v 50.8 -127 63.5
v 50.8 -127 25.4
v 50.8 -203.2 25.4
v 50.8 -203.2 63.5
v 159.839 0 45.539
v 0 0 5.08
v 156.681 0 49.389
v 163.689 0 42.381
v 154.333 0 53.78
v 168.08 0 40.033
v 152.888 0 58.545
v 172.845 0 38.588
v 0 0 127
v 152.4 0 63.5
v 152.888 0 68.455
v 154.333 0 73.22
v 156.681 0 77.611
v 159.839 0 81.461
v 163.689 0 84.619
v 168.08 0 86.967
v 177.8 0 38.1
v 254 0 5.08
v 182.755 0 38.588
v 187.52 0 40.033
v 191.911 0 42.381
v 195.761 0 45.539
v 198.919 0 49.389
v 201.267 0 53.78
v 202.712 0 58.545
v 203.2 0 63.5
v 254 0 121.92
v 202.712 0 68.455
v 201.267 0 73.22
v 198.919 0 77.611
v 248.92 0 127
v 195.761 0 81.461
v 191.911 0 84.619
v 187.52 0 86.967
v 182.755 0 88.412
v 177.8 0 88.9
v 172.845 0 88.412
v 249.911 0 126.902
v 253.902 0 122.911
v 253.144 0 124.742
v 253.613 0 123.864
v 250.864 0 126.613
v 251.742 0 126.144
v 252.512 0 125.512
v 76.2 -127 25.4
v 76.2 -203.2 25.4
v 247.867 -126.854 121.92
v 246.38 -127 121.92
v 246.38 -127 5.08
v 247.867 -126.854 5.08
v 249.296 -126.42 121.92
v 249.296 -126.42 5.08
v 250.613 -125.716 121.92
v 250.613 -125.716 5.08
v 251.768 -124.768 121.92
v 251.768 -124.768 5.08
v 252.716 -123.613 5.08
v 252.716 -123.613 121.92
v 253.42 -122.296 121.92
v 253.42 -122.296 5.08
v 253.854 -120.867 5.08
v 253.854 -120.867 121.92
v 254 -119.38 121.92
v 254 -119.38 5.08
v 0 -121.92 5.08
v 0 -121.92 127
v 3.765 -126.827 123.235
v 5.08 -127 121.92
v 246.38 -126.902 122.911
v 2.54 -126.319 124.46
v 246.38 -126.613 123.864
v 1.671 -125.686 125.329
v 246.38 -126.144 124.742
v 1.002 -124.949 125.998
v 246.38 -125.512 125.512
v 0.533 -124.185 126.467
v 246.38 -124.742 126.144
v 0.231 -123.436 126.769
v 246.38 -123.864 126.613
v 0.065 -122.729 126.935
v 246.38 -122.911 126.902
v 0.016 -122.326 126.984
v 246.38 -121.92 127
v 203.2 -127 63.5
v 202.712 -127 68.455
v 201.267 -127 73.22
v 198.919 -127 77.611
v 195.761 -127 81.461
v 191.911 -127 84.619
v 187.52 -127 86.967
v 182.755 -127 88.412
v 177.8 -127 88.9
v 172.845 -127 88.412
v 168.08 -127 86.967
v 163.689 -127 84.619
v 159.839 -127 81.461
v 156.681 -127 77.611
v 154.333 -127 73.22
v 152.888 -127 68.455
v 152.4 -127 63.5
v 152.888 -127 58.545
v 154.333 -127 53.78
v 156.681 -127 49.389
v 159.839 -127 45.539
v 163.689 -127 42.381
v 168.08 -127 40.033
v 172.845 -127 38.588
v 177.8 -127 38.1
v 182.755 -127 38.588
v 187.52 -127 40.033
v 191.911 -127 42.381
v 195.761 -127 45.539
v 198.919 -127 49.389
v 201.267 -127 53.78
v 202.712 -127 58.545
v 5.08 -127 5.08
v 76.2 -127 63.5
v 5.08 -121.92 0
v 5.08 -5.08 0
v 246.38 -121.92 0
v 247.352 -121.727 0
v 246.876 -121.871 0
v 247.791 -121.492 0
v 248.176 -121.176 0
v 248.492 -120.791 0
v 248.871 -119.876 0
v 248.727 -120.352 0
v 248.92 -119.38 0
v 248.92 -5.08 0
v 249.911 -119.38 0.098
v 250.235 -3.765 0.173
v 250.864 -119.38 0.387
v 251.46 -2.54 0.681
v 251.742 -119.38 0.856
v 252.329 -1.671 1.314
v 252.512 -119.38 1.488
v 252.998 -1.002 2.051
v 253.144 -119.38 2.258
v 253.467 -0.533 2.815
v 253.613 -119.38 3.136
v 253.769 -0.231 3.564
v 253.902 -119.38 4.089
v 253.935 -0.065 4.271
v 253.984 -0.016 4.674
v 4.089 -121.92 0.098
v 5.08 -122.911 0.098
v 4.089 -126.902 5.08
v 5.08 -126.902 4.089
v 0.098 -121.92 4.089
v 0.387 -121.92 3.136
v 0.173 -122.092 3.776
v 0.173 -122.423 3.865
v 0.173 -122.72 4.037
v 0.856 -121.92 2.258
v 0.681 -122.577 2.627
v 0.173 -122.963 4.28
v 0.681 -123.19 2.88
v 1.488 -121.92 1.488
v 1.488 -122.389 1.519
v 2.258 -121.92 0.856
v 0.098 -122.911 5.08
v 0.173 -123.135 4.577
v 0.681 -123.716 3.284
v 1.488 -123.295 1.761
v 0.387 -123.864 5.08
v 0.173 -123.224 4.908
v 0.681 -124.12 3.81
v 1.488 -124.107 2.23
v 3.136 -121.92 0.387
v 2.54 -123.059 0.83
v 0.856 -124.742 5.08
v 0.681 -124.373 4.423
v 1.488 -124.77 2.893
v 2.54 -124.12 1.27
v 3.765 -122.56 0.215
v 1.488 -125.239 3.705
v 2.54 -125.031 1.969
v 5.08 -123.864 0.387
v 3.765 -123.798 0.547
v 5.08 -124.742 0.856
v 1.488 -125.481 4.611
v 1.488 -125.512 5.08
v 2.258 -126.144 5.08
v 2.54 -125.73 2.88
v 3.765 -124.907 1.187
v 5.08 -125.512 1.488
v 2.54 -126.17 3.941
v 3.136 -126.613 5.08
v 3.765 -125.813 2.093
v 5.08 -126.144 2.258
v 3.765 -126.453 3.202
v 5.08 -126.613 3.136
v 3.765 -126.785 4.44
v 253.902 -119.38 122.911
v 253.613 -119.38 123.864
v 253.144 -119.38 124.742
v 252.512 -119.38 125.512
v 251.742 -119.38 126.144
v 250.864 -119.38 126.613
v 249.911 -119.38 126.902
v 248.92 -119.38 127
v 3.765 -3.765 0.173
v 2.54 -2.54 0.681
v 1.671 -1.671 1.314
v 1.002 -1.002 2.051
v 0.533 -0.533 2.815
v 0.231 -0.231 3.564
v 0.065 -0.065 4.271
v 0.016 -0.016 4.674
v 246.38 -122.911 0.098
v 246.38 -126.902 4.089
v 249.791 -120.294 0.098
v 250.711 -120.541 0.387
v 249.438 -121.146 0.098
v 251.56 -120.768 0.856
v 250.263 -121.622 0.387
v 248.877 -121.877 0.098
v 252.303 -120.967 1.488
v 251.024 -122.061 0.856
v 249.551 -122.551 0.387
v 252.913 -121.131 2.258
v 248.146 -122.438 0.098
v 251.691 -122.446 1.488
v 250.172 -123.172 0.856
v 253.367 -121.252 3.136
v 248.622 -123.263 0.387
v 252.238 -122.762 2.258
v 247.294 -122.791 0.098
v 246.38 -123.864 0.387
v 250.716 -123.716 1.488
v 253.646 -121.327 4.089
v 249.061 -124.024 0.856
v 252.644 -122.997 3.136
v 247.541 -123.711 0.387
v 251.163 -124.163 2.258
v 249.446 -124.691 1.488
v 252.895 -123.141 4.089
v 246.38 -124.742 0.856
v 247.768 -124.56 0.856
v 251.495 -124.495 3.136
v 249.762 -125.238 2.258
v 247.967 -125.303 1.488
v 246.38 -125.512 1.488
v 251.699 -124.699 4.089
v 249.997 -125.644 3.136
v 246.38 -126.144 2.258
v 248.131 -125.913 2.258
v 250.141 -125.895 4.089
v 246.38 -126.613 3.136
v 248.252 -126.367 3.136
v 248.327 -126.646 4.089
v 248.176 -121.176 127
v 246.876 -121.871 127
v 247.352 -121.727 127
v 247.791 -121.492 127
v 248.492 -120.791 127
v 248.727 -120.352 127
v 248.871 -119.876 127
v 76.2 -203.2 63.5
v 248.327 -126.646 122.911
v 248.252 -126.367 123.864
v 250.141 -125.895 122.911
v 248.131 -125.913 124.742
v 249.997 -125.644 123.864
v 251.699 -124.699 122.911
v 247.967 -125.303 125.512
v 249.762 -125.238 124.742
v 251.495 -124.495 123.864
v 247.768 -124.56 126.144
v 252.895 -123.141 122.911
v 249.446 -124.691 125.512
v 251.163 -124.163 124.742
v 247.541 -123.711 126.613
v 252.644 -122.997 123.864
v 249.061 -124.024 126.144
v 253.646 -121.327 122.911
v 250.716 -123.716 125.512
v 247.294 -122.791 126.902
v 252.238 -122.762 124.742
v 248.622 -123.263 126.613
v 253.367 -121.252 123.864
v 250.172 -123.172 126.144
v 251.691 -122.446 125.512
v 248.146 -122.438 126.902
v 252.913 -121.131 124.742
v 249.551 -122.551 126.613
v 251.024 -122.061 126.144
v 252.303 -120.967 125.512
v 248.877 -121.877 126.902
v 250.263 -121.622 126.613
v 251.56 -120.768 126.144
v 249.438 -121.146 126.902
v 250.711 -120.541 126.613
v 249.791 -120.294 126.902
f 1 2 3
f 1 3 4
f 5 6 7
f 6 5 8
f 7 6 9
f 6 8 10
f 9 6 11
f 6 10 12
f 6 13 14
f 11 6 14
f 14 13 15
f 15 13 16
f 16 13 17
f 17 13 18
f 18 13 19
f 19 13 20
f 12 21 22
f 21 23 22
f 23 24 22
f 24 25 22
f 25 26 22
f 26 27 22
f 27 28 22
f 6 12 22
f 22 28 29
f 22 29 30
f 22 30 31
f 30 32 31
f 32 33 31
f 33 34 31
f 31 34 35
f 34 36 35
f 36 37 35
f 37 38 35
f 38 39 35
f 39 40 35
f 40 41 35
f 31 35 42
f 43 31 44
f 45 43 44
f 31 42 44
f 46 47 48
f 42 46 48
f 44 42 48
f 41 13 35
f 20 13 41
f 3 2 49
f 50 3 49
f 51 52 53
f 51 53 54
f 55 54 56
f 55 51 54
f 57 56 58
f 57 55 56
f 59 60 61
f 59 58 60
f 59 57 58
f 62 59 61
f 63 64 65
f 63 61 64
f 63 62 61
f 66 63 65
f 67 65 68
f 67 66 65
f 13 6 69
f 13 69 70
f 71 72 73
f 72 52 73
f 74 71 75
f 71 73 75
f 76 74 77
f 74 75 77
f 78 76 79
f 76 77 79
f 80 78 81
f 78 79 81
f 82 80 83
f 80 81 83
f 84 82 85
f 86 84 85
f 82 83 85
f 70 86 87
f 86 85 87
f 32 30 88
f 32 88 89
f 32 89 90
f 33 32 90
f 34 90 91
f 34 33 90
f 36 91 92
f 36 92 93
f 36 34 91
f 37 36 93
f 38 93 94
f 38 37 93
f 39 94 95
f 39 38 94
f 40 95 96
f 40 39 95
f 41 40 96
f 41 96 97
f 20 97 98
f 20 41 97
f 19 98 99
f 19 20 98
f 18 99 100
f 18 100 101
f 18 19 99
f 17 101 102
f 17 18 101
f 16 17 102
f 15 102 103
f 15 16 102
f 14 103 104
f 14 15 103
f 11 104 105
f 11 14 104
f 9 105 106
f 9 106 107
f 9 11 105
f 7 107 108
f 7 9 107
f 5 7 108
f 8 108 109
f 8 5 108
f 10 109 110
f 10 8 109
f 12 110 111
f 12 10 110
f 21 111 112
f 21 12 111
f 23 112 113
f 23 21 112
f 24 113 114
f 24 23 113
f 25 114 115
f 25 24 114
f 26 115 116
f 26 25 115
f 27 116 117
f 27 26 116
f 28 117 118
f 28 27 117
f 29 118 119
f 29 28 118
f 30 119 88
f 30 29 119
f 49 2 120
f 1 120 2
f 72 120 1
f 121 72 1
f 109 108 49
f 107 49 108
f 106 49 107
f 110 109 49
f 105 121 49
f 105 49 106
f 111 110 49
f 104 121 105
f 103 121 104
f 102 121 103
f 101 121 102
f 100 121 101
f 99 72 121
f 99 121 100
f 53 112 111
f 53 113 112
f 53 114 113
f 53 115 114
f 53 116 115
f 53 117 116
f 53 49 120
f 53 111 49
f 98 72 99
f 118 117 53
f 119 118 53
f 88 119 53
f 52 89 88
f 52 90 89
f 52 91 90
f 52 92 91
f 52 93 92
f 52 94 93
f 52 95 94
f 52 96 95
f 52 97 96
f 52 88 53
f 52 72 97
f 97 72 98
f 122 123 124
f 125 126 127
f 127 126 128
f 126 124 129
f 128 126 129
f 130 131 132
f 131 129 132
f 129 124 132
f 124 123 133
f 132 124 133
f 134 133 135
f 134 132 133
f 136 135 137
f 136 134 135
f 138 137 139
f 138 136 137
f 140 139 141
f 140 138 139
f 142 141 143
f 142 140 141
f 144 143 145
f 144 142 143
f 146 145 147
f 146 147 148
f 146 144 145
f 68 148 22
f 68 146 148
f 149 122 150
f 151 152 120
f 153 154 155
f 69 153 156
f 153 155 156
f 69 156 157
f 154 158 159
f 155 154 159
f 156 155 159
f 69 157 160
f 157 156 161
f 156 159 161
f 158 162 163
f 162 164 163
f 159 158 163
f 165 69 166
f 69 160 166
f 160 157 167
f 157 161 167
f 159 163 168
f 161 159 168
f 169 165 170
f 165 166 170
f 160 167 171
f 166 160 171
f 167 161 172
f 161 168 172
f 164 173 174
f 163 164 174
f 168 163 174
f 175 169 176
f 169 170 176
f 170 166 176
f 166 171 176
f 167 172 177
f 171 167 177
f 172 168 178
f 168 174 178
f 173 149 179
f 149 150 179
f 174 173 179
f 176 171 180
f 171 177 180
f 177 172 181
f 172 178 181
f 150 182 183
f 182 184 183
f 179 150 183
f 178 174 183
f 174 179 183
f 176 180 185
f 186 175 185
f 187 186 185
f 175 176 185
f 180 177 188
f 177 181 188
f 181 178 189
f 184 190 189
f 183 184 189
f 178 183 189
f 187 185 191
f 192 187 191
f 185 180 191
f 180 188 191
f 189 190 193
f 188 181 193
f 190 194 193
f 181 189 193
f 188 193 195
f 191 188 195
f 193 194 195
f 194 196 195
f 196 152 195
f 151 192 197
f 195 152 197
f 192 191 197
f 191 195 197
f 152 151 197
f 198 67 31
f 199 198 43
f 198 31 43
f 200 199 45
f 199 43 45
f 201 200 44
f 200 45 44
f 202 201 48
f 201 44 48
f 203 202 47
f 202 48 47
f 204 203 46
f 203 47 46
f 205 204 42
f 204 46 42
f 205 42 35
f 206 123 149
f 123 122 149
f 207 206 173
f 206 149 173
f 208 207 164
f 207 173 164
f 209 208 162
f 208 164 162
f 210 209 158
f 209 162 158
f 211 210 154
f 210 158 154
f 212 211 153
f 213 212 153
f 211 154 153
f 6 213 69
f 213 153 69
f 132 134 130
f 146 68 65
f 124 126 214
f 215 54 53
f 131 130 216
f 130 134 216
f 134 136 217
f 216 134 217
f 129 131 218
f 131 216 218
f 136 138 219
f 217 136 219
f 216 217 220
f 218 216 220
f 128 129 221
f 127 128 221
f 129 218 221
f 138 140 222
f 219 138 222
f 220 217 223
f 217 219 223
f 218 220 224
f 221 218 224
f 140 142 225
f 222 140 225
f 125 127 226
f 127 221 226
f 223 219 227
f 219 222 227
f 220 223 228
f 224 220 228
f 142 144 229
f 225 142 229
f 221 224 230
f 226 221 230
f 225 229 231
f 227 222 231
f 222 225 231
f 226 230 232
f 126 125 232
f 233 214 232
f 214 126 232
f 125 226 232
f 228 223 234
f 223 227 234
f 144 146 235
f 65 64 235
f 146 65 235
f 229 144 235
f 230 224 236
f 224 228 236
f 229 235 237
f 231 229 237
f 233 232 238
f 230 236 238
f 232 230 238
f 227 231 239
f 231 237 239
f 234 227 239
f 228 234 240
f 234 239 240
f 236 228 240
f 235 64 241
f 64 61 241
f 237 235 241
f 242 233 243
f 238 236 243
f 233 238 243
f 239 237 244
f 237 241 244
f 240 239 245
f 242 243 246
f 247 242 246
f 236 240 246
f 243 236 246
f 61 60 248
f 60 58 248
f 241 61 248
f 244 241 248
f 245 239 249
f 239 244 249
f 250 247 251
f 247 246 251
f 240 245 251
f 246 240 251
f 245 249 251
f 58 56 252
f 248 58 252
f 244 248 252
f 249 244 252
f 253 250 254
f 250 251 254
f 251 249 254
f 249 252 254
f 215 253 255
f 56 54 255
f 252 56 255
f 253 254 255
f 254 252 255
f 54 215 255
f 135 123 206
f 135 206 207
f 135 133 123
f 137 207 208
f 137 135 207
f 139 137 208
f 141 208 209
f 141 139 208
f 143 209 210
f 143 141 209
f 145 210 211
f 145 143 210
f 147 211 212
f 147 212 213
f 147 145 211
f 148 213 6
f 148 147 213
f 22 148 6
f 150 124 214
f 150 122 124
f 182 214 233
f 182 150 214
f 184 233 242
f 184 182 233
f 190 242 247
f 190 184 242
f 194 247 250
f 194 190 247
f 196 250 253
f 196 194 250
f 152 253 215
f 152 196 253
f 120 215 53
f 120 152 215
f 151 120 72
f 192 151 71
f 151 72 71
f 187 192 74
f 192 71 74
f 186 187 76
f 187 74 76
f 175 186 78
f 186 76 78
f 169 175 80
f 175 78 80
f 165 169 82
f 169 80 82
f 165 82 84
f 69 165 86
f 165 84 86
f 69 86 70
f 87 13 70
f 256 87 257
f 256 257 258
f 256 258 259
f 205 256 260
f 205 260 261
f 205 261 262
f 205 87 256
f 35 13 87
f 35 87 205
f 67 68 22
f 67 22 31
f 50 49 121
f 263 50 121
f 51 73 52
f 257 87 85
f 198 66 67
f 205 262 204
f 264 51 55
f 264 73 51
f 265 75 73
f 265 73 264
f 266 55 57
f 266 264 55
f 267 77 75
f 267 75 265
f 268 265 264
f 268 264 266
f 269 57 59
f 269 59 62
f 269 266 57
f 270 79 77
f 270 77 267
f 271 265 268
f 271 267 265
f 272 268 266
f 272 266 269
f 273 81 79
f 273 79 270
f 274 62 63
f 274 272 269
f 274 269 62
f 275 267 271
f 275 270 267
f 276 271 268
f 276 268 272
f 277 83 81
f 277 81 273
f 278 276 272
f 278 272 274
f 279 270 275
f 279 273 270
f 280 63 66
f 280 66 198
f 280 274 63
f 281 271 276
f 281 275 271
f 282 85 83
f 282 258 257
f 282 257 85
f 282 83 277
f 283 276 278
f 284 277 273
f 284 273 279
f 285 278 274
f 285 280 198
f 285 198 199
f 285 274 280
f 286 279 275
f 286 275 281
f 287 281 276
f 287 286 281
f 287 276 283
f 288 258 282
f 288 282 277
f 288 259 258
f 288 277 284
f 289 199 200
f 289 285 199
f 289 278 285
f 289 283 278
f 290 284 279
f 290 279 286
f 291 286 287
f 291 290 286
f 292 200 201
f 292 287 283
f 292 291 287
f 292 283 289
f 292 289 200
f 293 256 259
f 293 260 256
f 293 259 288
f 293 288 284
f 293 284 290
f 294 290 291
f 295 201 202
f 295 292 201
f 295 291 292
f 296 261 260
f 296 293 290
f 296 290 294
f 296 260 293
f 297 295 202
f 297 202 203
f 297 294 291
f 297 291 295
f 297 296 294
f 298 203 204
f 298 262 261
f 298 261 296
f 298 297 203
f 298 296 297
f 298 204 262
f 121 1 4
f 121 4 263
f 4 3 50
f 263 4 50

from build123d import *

# Parameters (mm, degrees)
F0_W     = 254
F0_H     = 127
F0_R     = 25.4
F1_DEPTH = 127
F2_W     = 25.4
F2_H     = 38.1
F3_DEPTH = 76.2
F4_R     = 7.62
F5_R     = 5.08


with BuildPart() as f1:
    # F0 (on Front) → F1 (new body)
    with BuildSketch(Plane.XZ):
        with Locations((127, 63.5)):
            Rectangle(F0_W, F0_H)
        with Locations((177.8, 63.5)):
            Circle(F0_R, mode=Mode.SUBTRACT)
    extrude(amount=F1_DEPTH)

    # F2 (on face) → F3 (join)
    with BuildSketch(Plane.XZ.offset(127)):
        with Locations((63.5, 44.45)):
            Rectangle(F2_W, F2_H)
    extrude(amount=F3_DEPTH)

    # F4
    f4_edges = [f1.edges().sort_by_distance(p)[0] for p in [
        (254, -127, 63.5),
    ]]
    fillet(f4_edges, radius=F4_R)

    # F5
    f5_edges = [f1.edges().sort_by_distance(p)[0] for p in [
        (254, -59.69, 0),
        (251.768154, -124.768154, 0),
        (127, 0, 0),
        (123.19, -127, 0),
        (0, -63.5, 0),
        (0, -127, 63.5),
        (123.19, -127, 127),
    ]]
    fillet(f5_edges, radius=F5_R)


solid = f1.part
